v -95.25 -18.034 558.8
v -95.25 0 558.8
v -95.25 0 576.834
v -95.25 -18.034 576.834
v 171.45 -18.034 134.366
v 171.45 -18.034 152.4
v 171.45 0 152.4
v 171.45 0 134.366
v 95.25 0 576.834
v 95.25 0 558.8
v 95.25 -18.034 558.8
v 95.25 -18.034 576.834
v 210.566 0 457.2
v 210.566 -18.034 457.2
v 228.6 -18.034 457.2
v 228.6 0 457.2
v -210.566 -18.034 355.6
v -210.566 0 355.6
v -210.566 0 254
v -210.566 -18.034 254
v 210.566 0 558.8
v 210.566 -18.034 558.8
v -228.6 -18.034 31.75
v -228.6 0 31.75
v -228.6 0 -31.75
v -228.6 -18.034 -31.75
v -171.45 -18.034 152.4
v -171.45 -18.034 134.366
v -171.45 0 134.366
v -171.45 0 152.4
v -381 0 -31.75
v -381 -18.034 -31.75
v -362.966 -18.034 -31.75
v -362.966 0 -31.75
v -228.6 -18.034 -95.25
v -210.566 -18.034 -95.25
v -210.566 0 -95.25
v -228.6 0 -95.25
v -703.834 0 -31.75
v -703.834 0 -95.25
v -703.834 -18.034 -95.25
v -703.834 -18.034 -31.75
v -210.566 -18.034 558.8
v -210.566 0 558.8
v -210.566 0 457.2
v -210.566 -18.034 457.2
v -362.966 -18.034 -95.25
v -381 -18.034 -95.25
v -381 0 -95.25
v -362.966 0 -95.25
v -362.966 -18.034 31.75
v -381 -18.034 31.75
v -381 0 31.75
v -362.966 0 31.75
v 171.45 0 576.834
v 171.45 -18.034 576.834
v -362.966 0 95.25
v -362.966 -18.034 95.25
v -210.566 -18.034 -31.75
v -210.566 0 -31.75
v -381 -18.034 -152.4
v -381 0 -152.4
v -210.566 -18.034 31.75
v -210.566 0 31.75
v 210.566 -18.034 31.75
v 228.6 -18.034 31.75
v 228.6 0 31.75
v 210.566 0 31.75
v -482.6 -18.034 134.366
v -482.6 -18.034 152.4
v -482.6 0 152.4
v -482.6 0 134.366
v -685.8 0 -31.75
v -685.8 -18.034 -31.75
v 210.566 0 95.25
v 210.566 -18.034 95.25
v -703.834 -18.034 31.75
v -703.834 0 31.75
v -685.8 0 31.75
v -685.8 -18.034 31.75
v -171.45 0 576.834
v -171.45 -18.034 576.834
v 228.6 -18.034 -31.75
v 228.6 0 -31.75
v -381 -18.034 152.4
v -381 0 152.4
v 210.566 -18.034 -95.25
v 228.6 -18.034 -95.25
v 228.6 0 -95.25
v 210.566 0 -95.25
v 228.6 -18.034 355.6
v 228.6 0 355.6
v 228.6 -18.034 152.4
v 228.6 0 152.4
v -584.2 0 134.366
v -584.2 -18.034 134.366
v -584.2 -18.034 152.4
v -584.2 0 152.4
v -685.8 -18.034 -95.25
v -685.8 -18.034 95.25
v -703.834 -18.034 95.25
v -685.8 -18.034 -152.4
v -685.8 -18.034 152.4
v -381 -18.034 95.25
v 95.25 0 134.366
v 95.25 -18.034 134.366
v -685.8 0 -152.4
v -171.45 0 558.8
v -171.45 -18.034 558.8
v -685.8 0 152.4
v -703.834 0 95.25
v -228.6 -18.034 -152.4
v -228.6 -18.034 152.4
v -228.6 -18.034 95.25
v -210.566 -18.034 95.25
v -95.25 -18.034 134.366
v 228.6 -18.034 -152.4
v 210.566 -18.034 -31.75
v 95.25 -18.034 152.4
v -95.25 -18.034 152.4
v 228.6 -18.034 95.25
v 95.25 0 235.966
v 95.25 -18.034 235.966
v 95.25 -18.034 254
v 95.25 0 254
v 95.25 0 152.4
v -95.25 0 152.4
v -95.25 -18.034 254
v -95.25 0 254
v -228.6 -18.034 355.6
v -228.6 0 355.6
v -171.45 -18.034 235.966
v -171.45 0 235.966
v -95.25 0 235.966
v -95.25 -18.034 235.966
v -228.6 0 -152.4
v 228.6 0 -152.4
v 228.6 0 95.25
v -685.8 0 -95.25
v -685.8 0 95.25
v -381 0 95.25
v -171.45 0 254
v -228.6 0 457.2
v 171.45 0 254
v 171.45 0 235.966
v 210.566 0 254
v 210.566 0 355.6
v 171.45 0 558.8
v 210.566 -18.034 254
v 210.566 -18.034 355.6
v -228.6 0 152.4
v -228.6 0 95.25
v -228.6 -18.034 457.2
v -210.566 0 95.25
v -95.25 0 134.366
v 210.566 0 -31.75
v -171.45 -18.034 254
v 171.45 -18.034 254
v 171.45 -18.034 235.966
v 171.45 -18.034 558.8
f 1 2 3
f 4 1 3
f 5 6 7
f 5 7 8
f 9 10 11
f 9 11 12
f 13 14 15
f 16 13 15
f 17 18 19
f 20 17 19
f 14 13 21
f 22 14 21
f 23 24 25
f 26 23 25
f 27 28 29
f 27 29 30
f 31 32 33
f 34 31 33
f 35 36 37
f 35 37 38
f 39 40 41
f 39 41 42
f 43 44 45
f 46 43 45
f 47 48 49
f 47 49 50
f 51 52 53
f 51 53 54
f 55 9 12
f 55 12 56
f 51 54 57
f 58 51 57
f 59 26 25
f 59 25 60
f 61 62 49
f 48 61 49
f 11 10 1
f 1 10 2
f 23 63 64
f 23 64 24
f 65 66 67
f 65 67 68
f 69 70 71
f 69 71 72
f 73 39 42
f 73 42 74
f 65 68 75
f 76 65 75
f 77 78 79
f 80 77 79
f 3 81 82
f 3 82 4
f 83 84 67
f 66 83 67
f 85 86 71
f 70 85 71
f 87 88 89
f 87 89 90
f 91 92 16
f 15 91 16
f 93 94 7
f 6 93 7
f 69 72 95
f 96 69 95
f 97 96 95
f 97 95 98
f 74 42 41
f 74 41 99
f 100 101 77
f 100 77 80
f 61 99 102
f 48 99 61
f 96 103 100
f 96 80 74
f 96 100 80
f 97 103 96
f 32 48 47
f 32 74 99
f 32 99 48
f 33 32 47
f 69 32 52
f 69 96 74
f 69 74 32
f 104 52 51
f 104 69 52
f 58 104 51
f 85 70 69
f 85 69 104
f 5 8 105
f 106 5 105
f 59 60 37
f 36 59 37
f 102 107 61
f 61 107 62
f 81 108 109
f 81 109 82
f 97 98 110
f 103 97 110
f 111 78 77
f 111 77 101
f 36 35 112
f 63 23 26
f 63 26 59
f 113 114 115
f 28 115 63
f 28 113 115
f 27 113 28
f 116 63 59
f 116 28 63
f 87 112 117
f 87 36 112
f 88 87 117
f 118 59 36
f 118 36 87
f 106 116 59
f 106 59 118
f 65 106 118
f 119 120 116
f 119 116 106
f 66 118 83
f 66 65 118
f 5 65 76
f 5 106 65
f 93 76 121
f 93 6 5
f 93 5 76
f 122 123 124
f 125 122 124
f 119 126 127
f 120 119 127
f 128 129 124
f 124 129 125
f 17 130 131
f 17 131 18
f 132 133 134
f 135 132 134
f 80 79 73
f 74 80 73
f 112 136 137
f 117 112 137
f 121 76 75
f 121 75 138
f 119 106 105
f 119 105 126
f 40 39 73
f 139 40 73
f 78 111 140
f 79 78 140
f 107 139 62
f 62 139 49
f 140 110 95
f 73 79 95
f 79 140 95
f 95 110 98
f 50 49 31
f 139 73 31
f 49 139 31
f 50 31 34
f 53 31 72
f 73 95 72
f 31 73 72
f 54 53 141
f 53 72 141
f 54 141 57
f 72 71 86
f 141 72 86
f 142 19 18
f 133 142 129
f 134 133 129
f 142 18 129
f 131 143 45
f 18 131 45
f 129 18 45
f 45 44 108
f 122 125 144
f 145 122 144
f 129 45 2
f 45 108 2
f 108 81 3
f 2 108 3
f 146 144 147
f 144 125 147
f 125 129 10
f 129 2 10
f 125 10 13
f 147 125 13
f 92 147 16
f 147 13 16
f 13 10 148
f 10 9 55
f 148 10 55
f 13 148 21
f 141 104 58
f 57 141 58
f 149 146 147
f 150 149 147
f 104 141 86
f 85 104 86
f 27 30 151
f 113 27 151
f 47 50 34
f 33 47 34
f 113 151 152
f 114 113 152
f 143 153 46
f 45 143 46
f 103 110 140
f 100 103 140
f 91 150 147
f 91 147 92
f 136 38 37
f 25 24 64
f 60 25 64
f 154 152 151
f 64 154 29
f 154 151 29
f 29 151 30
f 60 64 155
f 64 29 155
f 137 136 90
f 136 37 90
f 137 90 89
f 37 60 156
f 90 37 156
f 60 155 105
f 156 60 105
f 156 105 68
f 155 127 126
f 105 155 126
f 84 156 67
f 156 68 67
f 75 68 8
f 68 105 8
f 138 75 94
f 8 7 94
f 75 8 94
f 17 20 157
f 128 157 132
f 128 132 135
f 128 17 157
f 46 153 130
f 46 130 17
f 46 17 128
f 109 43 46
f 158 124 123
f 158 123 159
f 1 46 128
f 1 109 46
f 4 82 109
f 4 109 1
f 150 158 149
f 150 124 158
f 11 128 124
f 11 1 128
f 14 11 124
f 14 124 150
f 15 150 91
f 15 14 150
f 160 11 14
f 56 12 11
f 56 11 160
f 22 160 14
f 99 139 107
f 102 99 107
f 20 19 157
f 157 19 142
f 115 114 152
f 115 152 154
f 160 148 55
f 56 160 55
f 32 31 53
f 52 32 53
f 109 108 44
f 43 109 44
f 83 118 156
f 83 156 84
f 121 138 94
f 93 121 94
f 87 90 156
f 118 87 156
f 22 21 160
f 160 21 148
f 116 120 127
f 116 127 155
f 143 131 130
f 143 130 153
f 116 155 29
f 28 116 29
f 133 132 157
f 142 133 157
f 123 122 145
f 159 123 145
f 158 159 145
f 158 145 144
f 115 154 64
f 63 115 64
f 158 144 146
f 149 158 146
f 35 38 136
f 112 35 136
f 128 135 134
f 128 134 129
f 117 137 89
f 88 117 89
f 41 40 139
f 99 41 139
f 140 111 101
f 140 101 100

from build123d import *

# Parameters (mm, degrees)
F1_W     = 18.034
F1_H     = 63.5
F2_DEPTH = 18.034
F1_W_2   = 76.2
F1_H_2   = 18.034
F1_H_3   = 101.6


# Not quite as in the source:
# - a variable given as a bare number and used for a length is read in inches; the dataset says mm whatever the document's units were


with BuildPart() as f2:
    # F1 (on Front) → F2 (new body)
    with BuildSketch(Plane.XZ):
        Polygon((-381, 95.25), (-381, 152.4), (-482.6, 152.4), (-482.6, 134.366), (-584.2, 134.366), (-584.2, 152.4), (-685.8, 152.4), (-685.8, 95.25), (-685.8, 31.75), (-685.8, -31.75), (-685.8, -95.25), (-685.8, -152.4), (-381, -152.4), (-381, -95.25), (-381, -31.75), (-381, 31.75), align=None)
        with Locations((-694.817, 63.5)):
            Rectangle(F1_W, F1_H)
        with Locations((-694.817, -63.5)):
            Rectangle(F1_W, F1_H)
        with Locations((-371.983, 63.5)):
            Rectangle(F1_W, F1_H)
        with Locations((-371.983, -63.5)):
            Rectangle(F1_W, F1_H)
    extrude(amount=F2_DEPTH)


with BuildPart() as f2b:
    # F1 (on Front) → F2, piece 2 (new body)
    with BuildSketch(Plane.XZ):
        Polygon((-171.45, 152.4), (-228.6, 152.4), (-228.6, 95.25), (-210.566, 95.25), (-210.566, 31.75), (-228.6, 31.75), (-228.6, -31.75), (-210.566, -31.75), (-210.566, -95.25), (-228.6, -95.25), (-228.6, -152.4), (228.6, -152.4), (228.6, -95.25), (210.566, -95.25), (210.566, -31.75), (228.6, -31.75), (228.6, 31.75), (210.566, 31.75), (210.566, 95.25), (228.6, 95.25), (228.6, 152.4), (171.45, 152.4), (171.45, 134.366), (95.25, 134.366), (95.25, 152.4), (-95.25, 152.4), (-95.25, 134.366), (-171.45, 134.366), align=None)
    extrude(amount=F2_DEPTH)


with BuildPart() as f2c:
    # F1 (on Front) → F2, piece 3 (new body)
    with BuildSketch(Plane.XZ):
        Polygon((-210.566, 254), (-171.45, 254), (-95.25, 254), (95.25, 254), (171.45, 254), (210.566, 254), (210.566, 355.6), (210.566, 457.2), (210.566, 558.8), (171.45, 558.8), (95.25, 558.8), (-95.25, 558.8), (-171.45, 558.8), (-210.566, 558.8), (-210.566, 457.2), (-210.566, 355.6), align=None)
        with Locations((-133.35, 567.817)):
            Rectangle(F1_W_2, F1_H_2)
        with Locations((133.35, 567.817)):
            Rectangle(F1_W_2, F1_H_2)
        with Locations((133.35, 244.983)):
            Rectangle(F1_W_2, F1_H_2)
        with Locations((-133.35, 244.983)):
            Rectangle(F1_W_2, F1_H_2)
        with Locations((-219.583, 406.4)):
            Rectangle(F1_W, F1_H_3)
        with Locations((219.583, 406.4)):
            Rectangle(F1_W, F1_H_3)
    extrude(amount=F2_DEPTH)


solid = Compound([f2.part, f2b.part, f2c.part])
